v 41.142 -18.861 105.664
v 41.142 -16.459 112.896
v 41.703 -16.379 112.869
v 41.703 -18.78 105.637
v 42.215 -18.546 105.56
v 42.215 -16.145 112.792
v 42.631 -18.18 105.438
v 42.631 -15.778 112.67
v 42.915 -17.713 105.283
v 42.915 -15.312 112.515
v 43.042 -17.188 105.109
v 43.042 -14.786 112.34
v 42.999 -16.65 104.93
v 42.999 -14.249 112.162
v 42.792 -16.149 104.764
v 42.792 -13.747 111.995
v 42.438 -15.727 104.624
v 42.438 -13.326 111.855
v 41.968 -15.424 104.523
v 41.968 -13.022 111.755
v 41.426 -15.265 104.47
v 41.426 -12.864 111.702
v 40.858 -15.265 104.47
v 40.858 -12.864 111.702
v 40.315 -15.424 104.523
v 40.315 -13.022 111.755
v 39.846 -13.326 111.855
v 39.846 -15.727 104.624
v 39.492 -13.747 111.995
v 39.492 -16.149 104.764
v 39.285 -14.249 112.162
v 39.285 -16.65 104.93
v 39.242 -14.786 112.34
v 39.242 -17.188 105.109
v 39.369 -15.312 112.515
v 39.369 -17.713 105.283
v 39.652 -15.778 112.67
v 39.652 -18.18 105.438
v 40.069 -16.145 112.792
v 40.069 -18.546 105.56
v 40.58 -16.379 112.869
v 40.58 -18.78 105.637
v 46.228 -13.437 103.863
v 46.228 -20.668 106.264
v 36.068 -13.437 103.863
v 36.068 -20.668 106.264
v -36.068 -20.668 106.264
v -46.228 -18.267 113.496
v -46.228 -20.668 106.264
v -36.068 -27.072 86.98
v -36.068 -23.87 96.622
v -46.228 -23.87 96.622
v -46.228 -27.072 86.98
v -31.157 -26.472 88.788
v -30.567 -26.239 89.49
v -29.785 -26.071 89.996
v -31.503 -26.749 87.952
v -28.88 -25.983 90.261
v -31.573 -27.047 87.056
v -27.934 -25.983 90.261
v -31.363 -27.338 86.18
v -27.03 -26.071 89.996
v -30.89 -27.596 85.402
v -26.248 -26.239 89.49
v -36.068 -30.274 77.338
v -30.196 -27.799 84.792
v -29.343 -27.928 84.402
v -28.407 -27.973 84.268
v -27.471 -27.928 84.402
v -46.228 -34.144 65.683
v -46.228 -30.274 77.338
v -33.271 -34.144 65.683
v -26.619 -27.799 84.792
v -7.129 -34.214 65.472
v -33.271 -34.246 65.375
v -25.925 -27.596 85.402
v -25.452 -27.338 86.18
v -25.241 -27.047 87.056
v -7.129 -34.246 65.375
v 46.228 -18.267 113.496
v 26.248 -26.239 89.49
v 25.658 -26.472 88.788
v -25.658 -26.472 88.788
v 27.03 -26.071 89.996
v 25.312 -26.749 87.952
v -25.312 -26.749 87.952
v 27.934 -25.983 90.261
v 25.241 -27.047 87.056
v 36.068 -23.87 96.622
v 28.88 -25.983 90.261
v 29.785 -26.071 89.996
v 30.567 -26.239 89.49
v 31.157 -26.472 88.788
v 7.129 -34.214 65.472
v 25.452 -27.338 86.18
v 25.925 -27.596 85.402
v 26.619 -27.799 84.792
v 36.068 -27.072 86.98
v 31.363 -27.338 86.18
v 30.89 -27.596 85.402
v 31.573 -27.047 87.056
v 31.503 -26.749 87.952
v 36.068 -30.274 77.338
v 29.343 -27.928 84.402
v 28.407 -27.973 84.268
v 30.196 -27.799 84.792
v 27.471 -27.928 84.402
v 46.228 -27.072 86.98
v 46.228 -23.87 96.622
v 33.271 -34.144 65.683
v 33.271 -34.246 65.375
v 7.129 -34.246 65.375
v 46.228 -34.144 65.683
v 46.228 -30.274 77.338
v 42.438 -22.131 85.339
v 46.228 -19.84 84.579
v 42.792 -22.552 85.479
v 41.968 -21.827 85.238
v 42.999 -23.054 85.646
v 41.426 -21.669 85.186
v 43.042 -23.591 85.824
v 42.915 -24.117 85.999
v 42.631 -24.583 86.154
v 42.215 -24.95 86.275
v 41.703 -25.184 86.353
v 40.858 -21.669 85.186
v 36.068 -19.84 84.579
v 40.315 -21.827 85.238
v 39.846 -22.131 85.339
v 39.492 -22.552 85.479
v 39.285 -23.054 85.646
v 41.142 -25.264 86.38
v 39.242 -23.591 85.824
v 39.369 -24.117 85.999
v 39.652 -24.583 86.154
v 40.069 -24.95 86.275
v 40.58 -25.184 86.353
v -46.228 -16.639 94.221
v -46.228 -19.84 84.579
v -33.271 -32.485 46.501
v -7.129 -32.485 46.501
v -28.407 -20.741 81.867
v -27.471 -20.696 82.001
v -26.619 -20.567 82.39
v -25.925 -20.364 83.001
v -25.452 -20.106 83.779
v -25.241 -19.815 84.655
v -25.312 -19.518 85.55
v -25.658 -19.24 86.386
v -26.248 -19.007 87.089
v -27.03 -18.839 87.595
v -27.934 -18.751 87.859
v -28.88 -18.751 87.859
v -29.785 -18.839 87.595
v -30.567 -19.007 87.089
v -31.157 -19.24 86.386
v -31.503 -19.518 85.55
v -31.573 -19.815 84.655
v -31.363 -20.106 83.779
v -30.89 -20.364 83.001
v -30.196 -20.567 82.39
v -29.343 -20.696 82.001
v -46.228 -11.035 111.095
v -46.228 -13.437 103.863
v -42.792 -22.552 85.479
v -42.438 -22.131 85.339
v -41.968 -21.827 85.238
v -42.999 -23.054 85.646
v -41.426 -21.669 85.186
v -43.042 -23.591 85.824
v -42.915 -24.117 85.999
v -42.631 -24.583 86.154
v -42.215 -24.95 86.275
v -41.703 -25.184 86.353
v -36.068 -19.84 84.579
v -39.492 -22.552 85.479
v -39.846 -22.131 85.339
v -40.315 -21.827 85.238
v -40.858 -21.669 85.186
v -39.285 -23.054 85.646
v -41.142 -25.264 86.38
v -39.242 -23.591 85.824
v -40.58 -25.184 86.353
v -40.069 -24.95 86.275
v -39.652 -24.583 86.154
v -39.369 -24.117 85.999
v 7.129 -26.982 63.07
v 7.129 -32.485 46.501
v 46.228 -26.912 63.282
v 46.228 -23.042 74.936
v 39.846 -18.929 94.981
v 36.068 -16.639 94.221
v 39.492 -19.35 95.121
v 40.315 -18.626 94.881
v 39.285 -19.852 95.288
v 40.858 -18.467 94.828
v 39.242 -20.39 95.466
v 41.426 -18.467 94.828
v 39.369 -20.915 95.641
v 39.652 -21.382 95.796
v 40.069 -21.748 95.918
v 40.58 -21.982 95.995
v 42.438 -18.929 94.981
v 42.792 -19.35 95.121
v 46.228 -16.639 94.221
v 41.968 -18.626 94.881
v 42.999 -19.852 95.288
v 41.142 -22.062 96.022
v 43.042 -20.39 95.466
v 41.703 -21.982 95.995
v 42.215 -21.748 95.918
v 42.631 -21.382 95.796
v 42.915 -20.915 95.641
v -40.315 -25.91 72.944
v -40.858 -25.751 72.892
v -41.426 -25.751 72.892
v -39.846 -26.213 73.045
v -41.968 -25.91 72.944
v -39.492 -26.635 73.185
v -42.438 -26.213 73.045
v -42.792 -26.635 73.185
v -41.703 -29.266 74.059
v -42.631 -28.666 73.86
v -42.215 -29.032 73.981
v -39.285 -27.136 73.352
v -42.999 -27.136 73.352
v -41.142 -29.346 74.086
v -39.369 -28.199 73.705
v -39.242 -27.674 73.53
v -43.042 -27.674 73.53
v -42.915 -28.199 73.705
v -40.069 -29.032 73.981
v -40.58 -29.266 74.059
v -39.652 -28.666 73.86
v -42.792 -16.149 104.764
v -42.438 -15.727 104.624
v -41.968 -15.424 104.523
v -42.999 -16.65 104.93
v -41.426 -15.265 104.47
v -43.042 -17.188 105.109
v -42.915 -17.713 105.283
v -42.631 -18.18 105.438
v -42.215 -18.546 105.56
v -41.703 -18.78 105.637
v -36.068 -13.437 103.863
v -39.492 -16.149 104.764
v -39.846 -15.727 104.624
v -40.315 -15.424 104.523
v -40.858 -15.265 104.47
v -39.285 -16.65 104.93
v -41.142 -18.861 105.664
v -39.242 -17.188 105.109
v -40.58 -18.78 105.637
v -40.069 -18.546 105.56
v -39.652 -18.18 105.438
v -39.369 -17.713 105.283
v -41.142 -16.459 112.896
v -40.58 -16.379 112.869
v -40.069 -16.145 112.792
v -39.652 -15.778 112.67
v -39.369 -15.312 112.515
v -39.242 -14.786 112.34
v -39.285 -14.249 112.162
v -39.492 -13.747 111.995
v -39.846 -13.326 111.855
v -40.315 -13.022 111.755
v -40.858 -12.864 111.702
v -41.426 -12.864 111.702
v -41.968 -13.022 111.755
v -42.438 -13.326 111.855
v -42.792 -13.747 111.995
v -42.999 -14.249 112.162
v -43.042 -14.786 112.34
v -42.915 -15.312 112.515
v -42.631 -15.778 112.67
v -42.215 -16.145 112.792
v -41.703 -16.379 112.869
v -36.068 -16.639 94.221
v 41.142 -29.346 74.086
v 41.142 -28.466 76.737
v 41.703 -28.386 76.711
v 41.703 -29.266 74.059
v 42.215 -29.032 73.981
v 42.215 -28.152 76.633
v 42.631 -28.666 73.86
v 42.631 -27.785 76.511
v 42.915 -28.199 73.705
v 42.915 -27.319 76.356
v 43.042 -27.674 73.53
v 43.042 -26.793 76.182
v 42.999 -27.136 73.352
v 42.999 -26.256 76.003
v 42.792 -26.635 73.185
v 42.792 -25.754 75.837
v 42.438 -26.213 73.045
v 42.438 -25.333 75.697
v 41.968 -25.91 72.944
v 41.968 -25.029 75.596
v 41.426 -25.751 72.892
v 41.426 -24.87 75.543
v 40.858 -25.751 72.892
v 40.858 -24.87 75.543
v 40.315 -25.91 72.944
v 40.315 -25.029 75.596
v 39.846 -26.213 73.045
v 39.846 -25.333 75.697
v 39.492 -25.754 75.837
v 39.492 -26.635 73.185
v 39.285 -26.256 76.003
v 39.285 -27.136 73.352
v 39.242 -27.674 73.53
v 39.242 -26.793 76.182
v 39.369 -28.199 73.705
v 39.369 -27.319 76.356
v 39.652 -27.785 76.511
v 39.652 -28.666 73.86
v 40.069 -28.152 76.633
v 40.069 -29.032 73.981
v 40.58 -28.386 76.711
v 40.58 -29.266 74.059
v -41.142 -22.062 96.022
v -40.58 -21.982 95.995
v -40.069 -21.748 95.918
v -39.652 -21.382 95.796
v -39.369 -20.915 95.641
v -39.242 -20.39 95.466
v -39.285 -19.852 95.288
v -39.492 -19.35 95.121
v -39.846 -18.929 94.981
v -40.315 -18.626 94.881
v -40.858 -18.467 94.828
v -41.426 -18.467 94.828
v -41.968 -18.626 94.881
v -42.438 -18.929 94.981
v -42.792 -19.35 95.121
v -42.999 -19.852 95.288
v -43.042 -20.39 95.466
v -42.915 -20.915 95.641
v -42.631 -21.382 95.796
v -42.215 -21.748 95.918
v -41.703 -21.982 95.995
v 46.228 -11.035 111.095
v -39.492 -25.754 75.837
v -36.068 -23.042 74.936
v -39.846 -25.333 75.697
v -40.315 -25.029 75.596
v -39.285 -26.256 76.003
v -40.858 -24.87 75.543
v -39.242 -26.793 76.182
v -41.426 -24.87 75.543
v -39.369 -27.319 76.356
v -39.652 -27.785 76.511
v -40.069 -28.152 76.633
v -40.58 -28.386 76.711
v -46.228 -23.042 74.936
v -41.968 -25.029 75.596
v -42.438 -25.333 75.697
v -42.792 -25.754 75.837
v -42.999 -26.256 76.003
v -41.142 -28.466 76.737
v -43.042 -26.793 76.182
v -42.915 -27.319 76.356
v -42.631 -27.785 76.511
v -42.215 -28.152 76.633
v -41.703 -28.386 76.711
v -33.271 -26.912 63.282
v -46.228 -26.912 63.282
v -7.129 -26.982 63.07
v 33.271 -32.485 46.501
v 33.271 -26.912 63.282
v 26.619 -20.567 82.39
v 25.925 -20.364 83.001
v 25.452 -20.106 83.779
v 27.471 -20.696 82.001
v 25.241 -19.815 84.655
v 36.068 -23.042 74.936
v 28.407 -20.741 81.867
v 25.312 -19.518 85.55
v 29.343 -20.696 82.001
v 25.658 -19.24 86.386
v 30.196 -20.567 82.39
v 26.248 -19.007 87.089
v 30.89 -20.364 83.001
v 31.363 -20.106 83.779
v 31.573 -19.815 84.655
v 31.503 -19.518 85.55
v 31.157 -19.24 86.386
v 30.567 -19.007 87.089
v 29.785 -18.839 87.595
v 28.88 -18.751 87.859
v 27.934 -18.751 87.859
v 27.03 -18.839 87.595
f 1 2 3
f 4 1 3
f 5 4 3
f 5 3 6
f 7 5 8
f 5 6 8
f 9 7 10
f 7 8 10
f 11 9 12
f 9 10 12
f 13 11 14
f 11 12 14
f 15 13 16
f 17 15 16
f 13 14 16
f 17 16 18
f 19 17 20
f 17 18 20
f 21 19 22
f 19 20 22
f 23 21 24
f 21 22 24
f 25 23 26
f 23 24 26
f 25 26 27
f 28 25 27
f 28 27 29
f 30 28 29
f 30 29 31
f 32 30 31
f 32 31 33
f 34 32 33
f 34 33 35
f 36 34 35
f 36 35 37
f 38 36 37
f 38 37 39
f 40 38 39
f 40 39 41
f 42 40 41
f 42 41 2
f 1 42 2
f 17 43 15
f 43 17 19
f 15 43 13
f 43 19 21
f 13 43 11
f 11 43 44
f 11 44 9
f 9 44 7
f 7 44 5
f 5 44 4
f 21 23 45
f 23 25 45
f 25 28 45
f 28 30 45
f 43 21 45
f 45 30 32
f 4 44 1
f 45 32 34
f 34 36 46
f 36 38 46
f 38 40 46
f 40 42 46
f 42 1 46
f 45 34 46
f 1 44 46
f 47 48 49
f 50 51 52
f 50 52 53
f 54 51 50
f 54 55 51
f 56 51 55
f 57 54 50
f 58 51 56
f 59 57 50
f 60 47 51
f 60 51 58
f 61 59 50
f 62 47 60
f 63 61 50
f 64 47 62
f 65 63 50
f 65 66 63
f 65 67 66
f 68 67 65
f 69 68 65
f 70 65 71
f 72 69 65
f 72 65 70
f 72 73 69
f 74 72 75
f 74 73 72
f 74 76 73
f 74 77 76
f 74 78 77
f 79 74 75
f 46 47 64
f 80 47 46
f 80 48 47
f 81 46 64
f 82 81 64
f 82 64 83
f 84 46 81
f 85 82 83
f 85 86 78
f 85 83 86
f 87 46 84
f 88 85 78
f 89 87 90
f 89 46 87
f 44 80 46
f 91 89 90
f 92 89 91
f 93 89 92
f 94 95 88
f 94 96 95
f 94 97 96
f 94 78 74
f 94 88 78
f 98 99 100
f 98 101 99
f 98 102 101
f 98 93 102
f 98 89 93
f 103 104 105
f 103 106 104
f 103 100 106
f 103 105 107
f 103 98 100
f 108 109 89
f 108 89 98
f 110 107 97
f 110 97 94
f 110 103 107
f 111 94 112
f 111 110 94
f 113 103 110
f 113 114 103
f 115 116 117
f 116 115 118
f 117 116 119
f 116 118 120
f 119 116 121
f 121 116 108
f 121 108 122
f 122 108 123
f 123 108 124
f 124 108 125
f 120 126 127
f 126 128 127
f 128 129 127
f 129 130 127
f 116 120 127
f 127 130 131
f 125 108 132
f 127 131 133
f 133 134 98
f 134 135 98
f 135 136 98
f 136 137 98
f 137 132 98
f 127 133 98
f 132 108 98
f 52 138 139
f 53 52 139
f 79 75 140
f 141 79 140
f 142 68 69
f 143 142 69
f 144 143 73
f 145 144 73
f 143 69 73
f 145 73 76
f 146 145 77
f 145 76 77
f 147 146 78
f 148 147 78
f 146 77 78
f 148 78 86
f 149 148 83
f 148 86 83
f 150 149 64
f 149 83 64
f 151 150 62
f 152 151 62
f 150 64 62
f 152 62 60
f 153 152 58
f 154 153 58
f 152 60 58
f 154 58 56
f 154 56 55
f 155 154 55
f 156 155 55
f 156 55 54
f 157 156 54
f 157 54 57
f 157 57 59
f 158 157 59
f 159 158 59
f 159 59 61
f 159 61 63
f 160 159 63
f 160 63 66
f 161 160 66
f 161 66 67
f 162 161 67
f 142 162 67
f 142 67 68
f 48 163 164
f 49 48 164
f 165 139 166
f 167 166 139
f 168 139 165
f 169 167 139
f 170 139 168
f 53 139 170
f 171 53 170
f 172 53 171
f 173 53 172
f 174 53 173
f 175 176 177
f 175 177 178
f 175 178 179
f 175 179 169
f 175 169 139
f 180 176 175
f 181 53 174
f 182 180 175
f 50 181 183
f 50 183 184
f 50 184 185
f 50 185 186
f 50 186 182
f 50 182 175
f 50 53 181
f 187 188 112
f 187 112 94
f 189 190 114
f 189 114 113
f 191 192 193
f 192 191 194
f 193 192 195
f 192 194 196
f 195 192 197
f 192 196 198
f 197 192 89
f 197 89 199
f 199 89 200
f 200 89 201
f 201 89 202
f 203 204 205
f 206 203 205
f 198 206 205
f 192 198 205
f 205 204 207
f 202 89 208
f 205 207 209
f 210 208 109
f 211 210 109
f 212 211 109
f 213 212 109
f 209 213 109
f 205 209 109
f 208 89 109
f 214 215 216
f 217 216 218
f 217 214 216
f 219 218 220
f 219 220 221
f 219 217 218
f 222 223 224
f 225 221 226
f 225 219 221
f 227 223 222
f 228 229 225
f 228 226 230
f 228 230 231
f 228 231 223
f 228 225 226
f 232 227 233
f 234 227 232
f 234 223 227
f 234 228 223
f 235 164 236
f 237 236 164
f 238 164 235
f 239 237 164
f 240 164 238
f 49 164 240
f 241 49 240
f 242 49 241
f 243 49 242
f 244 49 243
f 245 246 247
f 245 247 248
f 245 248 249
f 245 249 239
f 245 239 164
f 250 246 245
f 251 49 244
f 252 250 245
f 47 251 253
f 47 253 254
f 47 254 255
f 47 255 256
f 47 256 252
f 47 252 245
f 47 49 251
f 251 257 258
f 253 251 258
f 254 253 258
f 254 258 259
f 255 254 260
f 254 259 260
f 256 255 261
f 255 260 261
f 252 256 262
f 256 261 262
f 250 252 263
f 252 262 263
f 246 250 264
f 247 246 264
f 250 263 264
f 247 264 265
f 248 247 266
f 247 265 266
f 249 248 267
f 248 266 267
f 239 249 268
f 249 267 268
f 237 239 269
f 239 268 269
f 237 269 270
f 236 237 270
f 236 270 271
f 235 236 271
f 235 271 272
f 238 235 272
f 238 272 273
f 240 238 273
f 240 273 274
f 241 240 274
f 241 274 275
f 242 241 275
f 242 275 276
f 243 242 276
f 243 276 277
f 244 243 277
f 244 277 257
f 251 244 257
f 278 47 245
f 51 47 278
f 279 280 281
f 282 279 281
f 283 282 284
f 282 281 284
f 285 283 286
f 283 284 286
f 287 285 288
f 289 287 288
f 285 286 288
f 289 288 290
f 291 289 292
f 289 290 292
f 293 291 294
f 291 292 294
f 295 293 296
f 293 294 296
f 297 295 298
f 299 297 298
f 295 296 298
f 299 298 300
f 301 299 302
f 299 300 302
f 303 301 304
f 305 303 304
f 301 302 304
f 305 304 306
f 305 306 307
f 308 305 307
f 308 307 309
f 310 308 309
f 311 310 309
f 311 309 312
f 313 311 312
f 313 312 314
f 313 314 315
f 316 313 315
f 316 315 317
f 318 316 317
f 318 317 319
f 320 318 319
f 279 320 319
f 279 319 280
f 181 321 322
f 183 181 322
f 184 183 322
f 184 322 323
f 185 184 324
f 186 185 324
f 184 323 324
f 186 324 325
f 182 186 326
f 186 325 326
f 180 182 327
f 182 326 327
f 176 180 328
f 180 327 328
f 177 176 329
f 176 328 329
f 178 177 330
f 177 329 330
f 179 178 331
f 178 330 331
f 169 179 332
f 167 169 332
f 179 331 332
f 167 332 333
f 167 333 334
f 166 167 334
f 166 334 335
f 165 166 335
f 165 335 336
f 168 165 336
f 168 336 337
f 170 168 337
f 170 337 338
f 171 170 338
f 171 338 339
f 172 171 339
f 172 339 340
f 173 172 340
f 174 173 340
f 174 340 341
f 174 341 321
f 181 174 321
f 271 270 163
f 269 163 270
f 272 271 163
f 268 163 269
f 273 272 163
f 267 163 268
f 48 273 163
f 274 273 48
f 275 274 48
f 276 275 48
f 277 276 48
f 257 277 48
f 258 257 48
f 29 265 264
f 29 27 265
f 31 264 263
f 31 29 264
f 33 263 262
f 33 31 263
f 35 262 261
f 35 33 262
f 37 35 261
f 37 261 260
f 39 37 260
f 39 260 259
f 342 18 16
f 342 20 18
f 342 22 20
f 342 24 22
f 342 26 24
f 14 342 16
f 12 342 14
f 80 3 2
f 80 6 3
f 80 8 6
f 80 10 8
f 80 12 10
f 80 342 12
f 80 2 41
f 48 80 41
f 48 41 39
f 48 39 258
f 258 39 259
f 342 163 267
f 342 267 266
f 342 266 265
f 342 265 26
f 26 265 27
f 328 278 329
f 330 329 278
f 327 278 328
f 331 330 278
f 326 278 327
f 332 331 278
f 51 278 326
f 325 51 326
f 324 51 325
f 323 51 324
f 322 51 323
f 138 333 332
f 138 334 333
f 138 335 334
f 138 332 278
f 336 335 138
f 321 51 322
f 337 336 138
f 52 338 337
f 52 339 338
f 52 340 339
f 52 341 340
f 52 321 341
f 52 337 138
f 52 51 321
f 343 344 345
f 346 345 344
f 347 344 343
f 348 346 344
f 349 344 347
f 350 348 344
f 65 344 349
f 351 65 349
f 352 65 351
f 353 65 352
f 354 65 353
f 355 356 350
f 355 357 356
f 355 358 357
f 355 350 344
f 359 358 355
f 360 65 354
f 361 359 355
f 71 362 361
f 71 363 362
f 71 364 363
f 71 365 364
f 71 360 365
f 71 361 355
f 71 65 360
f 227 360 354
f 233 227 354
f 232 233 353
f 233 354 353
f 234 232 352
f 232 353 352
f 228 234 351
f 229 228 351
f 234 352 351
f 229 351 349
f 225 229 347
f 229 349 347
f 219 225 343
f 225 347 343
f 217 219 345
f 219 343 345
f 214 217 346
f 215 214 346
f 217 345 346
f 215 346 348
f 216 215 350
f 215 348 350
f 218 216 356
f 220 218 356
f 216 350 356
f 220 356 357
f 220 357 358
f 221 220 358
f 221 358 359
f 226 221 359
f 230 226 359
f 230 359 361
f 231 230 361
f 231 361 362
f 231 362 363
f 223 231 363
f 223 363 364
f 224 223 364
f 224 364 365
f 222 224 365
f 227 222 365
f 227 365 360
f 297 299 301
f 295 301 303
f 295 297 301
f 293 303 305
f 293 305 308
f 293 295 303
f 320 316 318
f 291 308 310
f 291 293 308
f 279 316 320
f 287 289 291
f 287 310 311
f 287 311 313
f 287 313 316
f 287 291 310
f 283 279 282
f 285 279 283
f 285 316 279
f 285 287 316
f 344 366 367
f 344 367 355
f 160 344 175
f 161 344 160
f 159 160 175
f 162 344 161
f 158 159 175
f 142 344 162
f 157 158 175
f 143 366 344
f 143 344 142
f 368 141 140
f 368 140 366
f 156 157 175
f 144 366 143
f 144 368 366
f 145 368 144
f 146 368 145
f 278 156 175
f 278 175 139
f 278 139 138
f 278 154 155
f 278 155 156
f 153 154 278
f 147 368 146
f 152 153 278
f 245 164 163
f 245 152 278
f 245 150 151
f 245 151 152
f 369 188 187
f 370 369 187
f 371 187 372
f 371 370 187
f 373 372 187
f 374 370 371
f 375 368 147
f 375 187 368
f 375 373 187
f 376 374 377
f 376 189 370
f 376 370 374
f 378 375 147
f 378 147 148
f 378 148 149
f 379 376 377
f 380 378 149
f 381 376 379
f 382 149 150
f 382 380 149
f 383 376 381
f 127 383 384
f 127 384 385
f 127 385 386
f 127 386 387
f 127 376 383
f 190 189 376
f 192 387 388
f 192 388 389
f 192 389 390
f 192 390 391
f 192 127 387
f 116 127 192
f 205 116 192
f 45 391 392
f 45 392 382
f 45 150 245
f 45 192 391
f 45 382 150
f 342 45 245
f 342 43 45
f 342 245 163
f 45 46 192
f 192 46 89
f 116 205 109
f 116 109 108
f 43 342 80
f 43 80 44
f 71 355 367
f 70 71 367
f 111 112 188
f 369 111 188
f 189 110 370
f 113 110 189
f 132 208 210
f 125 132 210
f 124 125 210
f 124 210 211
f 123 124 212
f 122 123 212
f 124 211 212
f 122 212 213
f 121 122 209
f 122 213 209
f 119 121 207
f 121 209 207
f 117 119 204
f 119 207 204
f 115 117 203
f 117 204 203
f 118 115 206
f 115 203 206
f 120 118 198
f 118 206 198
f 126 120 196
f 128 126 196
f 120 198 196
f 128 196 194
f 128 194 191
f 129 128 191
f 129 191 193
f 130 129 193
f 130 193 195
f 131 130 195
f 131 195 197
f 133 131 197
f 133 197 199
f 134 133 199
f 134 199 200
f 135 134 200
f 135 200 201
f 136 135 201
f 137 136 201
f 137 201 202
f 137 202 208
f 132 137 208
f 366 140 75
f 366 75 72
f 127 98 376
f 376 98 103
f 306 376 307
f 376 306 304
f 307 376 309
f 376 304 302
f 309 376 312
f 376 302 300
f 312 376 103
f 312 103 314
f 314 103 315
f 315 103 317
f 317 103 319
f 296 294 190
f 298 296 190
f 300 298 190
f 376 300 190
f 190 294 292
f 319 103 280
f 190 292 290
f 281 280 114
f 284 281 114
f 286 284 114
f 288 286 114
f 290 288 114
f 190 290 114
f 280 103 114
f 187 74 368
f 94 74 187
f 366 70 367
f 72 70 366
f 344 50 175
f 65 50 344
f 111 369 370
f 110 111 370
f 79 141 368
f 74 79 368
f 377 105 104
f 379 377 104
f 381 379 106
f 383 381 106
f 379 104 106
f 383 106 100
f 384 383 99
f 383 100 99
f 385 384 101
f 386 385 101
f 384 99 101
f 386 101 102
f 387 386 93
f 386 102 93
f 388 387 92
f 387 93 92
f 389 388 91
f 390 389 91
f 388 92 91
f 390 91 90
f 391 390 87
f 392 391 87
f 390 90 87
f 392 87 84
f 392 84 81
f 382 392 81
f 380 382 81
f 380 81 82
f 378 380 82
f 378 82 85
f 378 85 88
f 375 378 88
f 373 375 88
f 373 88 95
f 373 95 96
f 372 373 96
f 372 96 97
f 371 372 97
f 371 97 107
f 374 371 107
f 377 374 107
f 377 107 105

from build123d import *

# Parameters (mm, degrees)
FRAME_DEPTH     = 46.228
SKETCH20_R      = 3.175
SKETCH20_W      = 14.25884162
SKETCH20_H      = 24.127005841
SKETCH20_W_2    = 24.268036887
SKETCH20_H_2    = 24.349806062
EXTRUDE25_DEPTH = 12.7
SKETCH34_R      = 1.905
EXTRUDE26_DEPTH = 40.894


with BuildPart() as part:
    # Sketch2 → Frame (new, symmetric)
    with BuildSketch(Plane(origin=(0, 0, 0), x_dir=(0, 0, -1), z_dir=(1, 0, 0))):
        Polygon((-113.496221263, -18.267135855), (-65.375232853, -34.246135229), (-46.500539013, -32.484524644), (-111.094862411, -11.035408837), align=None)
    extrude(amount=FRAME_DEPTH, both=True)

    # Sketch20 → Extrude25 (cut)
    with BuildSketch(Plane(origin=(0, -50.397568307, 16.734957844), x_dir=(1, 0, 0), z_dir=(0, -0.9490455404212153, 0.31513895698025596))):
        with Locations(Location((-28.407237147, 74.333896504, 0), (0, 0, 270))):
            Circle(SKETCH20_R)
        with Locations(Location((28.407237147, 74.333896504, 0), (0, 0, 270))):
            Circle(SKETCH20_R)
        Polygon((54.692263435, 94.336396504), (36.068, 94.336396504), (36.068, 84.176396504), (48.857667711, 84.176396504), (48.857667711, 74.016396504), (36.068, 74.016396504), (36.068, 63.856396504), (53.624725675, 63.856396504), align=None)
        with Locations((0, 39.290078215)):
            Rectangle(SKETCH20_W, SKETCH20_H)
        with Locations((45.40546607, 39.401478325)):
            Rectangle(SKETCH20_W_2, SKETCH20_H_2)
        with Locations((-45.40546607, 39.401478325)):
            Rectangle(SKETCH20_W_2, SKETCH20_H_2)
        Polygon((-53.624725675, 63.856396504), (-54.692263435, 94.336396504), (-36.068, 94.336396504), (-36.068, 84.176396504), (-48.857667711, 84.176396504), (-48.857667711, 74.016396504), (-36.068, 74.016396504), (-36.068, 63.856396504), align=None)
    extrude(amount=-EXTRUDE25_DEPTH, mode=Mode.SUBTRACT)

    # Sketch34 → Extrude26 (cut)
    with BuildSketch(Plane(origin=(0, 32.130432452, 96.761263419), x_dir=(1, 0, 0), z_dir=(0, 0.3151389569802559, 0.9490455404212153))):
        with Locations(Location((-41.141846717, -49.29342461, 0), (0, 0, 270))):
            Circle(SKETCH34_R)
        with Locations(Location((41.141846717, -49.29342461, 0), (0, 0, 270))):
            Circle(SKETCH34_R)
    extrude(amount=-EXTRUDE26_DEPTH, mode=Mode.SUBTRACT)


solid = part.part
